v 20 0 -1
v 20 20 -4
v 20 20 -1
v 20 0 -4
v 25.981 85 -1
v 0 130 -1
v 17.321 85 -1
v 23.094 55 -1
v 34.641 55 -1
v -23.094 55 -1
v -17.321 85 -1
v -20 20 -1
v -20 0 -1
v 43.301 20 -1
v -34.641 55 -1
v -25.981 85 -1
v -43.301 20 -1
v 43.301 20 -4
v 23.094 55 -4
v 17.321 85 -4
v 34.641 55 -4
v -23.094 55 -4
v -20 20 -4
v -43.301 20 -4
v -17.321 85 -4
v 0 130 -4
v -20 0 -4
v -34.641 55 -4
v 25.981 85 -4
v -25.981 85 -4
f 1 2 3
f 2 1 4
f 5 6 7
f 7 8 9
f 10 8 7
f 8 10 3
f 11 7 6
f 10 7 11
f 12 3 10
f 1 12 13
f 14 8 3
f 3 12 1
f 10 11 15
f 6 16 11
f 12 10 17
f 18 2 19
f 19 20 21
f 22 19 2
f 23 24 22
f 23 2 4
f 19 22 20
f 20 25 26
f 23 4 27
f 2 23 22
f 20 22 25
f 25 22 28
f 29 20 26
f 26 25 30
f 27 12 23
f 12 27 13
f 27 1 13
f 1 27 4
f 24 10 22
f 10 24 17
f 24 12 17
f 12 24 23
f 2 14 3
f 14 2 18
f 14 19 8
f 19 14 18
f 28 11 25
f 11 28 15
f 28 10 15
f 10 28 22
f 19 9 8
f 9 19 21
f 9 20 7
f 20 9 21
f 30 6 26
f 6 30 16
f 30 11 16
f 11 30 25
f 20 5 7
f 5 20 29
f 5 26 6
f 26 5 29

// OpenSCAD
thickness_top = 3;
thickness_stem = thickness_top;
facet = 0;


drill = thickness_top + 2;
depth_cutout = 3;
coutout_h = depth_cutout+1;

translate([0,0,-(thickness_top+1)])
{
    union(){
        translate([-20,0,0])
        {
            cube([40,35,thickness_stem]);
        }

        translate([-20 +20,45,0])
        {
            rotate([0,0,90])
            {
                cylinder(thickness_top,50-facet,50,$fn=3);
            }
        }

        translate([-20 +20,45+30,0])
        {
            rotate([0,0,90])
            {
                cylinder(thickness_top,40,40-facet,$fn=3);
            }
        }

        translate([-20 +20,45+30+25,0])
        {
            rotate([0,0,90])
            {
                cylinder(thickness_top,30,30-facet,$fn=3);
            }
        }
    }
}
